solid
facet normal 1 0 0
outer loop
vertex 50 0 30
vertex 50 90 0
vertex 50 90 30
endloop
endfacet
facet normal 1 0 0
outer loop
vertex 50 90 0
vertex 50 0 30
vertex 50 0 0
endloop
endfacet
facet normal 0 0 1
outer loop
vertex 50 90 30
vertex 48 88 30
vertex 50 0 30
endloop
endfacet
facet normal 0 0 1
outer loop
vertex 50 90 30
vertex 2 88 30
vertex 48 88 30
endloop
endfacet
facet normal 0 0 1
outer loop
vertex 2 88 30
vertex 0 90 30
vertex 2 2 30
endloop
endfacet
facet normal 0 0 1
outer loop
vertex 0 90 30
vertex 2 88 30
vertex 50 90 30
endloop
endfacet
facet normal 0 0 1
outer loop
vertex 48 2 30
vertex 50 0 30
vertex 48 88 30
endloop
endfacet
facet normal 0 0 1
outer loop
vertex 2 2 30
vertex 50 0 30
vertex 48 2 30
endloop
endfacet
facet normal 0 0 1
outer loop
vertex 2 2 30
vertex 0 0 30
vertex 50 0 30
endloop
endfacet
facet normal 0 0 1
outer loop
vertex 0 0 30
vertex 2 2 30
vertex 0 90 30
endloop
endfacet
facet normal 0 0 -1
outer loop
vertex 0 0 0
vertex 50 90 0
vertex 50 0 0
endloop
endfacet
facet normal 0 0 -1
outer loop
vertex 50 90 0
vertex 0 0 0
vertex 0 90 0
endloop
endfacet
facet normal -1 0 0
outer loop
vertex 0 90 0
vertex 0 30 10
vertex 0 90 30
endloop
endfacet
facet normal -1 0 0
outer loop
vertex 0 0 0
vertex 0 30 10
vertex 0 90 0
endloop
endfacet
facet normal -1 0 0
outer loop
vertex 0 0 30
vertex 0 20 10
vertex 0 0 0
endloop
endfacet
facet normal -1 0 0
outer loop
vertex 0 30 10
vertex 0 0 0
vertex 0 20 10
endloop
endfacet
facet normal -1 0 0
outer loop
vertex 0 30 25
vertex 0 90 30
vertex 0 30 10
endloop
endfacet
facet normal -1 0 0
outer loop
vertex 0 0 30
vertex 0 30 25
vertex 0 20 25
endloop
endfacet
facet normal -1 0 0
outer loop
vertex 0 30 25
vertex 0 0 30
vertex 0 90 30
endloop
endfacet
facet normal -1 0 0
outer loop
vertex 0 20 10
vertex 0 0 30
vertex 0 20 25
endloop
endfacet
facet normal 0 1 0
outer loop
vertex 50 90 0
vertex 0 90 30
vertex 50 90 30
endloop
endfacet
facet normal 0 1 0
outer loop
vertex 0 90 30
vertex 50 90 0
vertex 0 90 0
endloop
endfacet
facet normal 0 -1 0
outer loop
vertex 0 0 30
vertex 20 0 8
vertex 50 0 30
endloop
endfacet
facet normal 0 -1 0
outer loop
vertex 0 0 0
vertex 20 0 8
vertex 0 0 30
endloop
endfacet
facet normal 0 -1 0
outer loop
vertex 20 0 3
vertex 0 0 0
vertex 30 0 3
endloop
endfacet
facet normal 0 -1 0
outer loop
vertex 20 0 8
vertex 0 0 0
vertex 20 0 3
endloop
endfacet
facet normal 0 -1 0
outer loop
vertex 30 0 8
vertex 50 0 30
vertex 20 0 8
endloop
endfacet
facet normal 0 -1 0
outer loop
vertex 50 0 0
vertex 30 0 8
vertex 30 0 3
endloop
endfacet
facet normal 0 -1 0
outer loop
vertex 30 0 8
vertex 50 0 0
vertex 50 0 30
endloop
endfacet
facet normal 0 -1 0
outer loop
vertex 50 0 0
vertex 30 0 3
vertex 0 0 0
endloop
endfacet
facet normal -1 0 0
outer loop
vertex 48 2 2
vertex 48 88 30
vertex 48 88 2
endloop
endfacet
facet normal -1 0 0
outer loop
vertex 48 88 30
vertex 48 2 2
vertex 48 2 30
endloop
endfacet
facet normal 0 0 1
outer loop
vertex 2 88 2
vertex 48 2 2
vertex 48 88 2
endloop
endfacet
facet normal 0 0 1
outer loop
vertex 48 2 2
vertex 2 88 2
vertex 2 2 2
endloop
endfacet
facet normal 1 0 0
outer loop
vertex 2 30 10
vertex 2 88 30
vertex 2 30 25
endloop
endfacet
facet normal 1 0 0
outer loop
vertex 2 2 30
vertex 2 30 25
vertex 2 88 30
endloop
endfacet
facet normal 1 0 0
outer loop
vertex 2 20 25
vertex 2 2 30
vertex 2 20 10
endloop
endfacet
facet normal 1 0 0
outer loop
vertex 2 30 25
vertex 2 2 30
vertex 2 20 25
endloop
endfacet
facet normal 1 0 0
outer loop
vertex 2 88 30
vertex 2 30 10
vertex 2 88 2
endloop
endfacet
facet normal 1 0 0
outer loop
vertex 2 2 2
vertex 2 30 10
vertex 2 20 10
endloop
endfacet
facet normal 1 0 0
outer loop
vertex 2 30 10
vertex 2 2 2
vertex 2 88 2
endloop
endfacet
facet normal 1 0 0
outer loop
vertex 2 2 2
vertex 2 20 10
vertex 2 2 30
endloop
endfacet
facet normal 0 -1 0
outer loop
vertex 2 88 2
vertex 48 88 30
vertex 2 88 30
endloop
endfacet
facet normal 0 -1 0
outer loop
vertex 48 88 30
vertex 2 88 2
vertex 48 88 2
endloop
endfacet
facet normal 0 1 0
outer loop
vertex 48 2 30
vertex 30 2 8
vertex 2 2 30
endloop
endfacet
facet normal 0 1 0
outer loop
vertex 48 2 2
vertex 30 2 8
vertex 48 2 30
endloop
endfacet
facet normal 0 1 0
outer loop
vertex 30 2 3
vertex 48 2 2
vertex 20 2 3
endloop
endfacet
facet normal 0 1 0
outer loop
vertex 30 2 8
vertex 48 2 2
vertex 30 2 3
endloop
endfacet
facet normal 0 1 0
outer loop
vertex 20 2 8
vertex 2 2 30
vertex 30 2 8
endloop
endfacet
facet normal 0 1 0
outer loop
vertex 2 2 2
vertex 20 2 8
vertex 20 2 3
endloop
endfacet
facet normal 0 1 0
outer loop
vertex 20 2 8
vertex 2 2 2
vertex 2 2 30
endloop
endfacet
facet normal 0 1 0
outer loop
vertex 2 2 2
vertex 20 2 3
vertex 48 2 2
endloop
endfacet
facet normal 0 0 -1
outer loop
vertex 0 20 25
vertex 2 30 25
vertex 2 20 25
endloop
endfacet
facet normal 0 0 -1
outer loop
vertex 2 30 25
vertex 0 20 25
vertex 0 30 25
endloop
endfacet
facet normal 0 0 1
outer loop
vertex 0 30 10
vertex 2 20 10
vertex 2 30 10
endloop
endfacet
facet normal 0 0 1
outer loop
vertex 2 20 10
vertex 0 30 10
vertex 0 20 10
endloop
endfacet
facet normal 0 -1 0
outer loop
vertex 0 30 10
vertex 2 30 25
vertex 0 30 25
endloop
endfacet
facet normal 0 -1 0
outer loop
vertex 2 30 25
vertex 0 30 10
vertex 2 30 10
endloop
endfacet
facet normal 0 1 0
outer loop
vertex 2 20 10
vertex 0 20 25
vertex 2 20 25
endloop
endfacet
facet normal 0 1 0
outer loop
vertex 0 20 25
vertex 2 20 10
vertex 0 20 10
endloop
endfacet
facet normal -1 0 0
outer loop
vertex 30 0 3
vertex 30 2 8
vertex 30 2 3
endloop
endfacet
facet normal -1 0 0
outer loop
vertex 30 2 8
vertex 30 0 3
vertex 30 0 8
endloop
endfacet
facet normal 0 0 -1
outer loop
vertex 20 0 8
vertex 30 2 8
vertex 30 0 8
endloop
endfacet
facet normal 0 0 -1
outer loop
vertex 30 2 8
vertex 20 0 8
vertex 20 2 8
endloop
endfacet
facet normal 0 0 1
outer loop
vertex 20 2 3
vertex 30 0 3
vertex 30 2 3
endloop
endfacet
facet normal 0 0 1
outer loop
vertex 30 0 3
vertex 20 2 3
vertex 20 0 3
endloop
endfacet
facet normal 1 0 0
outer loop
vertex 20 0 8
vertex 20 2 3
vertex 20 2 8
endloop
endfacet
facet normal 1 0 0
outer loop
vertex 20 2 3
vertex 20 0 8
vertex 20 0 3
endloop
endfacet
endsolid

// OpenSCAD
// Parametryczna Obudowa 3D
// Miejsce na ESP32, ogniwo 18650 i moduł TP4056

wall = 2;
x_width = 50;
y_length = 90;
z_height = 30;

module case_body() {
    difference() {
        // Główna bryła
        cube([x_width, y_length, z_height]);
        
        // Wnętrze (wydrążenie)
        translate([wall, wall, wall])
            cube([x_width - 2*wall, y_length - 2*wall, z_height]);
            
        // Otwór na przełącznik (10x15mm kołyskowy) na bocznej ściance
        translate([-1, 20, 10])
            cube([5, 10, 15]);
            
        // Otwór na port USB z TP4056
        translate([x_width/2 - 5, -1, 3])
            cube([10, 5, 5]);
            
        // Duża obudowa na główny panel
translate([5, 5, z_height-2]) cube([40, 50, 5]);
    }
}

case_body();
